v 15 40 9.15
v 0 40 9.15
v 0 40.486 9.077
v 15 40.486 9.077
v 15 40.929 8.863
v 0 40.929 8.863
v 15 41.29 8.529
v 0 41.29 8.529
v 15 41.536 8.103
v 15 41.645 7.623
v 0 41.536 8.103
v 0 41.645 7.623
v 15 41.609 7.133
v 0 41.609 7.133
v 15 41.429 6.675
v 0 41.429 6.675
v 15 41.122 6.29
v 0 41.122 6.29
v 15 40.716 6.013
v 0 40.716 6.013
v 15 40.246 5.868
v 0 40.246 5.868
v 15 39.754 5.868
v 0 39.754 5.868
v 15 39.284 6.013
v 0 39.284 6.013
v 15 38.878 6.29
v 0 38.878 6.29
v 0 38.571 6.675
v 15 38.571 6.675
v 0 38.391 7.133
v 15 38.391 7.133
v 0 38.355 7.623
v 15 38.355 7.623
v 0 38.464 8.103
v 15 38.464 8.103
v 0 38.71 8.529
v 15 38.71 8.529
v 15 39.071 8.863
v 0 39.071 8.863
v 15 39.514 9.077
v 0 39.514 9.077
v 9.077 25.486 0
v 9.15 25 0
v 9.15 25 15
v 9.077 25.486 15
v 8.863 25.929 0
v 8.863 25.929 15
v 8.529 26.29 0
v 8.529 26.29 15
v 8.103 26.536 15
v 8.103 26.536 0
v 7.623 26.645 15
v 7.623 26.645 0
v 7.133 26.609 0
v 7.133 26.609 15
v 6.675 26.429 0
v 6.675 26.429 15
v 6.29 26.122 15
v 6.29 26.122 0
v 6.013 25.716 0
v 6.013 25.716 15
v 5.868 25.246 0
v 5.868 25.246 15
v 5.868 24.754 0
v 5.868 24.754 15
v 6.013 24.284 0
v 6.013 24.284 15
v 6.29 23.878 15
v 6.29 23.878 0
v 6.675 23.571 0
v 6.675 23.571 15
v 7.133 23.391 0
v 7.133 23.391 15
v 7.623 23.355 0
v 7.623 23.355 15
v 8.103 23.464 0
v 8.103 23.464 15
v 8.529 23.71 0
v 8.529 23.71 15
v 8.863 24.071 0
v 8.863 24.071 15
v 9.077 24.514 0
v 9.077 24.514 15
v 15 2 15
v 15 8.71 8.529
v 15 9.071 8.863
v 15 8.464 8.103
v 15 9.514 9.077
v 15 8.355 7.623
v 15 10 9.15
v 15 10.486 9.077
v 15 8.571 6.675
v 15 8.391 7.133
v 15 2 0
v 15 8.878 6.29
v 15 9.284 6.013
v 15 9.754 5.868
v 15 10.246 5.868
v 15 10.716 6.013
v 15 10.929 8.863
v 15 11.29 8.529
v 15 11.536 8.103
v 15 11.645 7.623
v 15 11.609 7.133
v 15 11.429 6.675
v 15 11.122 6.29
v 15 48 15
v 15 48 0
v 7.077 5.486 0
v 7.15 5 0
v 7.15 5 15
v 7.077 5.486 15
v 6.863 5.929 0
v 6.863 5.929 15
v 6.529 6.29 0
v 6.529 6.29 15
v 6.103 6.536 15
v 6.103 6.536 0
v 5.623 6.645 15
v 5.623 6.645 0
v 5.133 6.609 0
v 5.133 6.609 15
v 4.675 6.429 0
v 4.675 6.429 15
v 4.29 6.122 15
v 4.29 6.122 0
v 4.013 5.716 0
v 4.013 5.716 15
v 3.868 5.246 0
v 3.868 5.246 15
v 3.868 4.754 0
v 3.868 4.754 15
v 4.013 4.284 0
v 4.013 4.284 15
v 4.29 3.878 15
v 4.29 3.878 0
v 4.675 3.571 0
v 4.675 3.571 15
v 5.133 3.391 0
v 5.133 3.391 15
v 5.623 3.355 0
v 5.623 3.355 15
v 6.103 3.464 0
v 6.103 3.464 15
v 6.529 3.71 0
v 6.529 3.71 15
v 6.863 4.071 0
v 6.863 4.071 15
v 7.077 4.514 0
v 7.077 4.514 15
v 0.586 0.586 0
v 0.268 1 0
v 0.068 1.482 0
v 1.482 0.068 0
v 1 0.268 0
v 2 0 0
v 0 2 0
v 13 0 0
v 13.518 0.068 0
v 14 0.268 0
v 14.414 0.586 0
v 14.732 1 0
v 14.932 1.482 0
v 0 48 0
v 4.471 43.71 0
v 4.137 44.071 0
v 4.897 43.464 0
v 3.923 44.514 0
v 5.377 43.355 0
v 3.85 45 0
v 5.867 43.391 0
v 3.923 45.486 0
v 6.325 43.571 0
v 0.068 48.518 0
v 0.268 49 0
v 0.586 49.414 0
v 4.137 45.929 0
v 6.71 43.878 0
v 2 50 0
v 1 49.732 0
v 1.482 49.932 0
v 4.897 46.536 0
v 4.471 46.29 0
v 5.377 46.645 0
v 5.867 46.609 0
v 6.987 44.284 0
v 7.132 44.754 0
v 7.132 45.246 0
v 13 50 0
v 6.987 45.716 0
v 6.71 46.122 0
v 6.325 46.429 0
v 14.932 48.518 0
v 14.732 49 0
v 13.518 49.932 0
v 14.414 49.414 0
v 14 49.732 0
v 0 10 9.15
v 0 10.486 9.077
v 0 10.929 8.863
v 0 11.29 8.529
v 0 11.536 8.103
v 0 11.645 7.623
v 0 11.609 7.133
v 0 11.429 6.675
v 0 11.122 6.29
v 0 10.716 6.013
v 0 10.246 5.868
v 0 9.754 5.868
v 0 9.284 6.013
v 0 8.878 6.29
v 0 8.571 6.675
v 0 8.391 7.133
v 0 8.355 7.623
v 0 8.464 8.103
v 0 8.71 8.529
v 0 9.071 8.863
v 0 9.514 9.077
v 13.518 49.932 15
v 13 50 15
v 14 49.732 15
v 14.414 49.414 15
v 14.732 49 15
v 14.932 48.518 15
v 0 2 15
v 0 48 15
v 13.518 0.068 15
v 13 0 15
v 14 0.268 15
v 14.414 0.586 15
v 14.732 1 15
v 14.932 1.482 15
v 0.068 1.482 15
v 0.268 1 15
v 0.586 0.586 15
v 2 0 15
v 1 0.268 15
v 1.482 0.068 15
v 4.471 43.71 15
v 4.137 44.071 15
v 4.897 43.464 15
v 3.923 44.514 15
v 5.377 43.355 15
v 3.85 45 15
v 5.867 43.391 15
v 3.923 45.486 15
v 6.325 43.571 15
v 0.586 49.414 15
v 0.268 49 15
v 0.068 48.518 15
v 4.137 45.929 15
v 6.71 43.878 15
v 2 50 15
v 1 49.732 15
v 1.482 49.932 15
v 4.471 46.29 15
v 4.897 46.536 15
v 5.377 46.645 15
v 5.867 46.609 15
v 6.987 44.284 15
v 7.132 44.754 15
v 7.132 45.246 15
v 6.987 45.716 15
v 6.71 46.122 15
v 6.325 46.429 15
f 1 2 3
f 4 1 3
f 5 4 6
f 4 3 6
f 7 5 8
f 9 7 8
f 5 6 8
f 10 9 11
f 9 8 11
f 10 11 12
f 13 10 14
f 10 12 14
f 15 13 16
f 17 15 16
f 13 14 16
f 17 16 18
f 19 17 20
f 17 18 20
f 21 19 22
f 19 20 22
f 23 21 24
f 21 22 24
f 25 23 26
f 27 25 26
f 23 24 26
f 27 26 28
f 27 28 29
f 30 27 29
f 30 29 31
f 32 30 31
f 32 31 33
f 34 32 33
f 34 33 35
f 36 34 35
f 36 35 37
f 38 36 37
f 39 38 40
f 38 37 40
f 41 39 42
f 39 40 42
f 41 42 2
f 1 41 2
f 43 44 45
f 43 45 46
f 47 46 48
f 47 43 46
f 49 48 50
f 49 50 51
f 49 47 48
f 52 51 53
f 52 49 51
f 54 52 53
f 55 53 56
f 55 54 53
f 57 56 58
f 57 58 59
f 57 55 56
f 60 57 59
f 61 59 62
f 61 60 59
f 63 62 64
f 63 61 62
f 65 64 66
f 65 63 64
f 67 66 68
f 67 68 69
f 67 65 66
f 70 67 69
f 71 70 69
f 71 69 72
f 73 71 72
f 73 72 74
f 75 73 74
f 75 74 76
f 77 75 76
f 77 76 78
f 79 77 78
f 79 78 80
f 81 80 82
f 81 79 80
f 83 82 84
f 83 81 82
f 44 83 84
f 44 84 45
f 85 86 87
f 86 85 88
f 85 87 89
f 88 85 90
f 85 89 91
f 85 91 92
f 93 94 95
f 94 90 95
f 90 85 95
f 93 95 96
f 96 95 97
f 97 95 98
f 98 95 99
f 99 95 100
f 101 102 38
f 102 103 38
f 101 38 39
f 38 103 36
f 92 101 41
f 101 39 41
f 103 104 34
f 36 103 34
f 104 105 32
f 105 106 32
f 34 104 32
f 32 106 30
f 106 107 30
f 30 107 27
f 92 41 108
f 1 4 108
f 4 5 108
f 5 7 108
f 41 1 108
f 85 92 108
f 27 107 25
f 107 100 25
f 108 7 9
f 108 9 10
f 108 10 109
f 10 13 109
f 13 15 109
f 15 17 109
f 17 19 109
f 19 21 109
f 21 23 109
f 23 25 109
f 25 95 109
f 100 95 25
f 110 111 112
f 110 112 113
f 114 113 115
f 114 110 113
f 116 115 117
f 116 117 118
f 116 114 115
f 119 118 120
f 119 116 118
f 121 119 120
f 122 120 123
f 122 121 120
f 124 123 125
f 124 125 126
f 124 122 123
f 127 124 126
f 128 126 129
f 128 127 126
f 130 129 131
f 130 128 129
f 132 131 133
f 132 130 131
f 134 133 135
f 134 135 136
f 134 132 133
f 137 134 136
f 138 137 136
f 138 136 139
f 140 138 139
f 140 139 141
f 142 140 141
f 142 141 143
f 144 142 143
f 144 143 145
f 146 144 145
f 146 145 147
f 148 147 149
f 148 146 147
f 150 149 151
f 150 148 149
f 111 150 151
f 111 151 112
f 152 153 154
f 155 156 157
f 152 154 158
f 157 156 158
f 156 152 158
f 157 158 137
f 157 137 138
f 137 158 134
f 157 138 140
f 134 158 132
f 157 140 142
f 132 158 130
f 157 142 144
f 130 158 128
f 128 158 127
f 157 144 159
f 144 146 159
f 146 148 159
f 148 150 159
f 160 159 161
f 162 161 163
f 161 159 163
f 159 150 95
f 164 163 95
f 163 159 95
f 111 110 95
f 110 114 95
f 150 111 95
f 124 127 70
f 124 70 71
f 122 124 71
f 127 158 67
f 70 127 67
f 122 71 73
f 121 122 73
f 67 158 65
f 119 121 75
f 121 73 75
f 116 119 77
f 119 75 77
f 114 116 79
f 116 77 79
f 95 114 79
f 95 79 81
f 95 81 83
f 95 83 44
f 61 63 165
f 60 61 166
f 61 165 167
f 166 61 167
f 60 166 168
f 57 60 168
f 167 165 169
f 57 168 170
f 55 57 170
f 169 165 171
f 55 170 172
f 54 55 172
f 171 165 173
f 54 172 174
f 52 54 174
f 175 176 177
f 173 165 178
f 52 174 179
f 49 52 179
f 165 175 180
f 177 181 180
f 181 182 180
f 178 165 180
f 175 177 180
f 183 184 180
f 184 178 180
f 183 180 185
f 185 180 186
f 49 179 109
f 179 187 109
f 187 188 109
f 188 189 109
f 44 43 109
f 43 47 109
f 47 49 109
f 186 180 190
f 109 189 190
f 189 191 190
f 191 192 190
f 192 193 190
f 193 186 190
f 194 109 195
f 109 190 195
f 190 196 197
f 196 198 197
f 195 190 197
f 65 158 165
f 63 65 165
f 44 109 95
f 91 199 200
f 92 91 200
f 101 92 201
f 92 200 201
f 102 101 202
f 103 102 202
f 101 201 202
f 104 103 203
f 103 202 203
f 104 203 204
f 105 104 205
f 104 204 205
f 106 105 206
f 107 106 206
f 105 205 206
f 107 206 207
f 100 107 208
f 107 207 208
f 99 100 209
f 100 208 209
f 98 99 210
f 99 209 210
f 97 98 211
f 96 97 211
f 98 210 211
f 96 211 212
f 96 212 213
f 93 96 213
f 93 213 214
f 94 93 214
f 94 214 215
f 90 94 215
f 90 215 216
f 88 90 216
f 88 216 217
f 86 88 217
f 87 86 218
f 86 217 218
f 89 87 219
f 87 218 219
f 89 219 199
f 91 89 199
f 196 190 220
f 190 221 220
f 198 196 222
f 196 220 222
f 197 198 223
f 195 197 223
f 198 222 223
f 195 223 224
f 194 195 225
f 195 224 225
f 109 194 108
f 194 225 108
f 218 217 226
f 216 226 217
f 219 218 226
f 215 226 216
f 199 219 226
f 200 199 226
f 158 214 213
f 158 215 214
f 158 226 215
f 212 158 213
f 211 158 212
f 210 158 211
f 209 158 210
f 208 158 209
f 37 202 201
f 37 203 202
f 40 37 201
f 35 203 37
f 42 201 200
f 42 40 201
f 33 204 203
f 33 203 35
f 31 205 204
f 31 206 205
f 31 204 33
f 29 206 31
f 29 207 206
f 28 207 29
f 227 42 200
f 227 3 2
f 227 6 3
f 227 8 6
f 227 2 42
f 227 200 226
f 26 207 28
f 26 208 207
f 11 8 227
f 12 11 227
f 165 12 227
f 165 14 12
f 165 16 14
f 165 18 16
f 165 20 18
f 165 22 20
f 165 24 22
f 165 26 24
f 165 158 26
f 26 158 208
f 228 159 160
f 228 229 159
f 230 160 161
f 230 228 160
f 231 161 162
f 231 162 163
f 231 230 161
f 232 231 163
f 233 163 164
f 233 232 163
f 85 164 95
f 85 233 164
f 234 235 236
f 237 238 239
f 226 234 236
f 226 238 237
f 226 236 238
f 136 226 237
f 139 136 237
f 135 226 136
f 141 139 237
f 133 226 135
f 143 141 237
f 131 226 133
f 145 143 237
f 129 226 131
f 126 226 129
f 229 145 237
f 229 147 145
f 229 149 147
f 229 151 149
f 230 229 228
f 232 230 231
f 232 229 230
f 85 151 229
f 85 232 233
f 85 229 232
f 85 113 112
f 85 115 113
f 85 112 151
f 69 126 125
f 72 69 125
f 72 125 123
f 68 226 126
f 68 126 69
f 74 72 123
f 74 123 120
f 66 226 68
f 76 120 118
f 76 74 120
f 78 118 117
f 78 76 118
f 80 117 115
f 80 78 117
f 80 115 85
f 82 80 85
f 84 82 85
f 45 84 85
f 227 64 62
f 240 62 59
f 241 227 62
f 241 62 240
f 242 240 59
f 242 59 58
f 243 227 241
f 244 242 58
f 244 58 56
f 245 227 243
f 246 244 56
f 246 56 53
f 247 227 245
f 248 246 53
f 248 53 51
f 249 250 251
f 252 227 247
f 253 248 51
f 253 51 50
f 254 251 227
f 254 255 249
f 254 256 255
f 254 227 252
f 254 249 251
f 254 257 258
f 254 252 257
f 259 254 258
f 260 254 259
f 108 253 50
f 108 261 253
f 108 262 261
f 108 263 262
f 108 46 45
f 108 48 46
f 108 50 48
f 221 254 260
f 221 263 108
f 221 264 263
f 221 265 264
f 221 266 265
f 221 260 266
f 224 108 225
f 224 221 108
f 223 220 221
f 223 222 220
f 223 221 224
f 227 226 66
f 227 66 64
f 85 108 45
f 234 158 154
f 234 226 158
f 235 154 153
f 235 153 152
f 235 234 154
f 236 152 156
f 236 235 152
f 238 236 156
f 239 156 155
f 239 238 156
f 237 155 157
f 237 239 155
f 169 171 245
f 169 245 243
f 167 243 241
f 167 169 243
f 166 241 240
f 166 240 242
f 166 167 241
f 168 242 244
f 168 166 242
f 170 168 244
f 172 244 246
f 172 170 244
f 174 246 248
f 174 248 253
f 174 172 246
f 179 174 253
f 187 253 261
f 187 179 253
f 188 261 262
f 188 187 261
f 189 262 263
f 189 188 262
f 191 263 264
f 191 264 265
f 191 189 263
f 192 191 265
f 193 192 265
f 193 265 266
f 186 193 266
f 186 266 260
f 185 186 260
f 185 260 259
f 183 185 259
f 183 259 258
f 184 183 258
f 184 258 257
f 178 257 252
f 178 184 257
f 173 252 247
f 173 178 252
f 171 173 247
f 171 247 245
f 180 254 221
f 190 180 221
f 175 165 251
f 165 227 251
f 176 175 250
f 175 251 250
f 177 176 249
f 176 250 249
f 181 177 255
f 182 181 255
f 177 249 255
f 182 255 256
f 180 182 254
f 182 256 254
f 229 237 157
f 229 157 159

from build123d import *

# Parameters (mm, degrees)
SKETCH_1_W          = 15
SKETCH_1_H          = 50
SKETCH_1_R          = 1.65
EXTRUDE_1_DEPTH     = 15
SKETCH_2_R          = 1.65
CUT_EXTRUDE_1_DEPTH = 15
FILLET_1_R          = 2


with BuildPart() as part:
    # ｽｹｯﾁ1 → ﾎﾞｽ - 押し出し1 (new body)
    with BuildSketch(Plane.XY):
        with Locations((7.5, 25)):
            Rectangle(SKETCH_1_W, SKETCH_1_H)
        with Locations((5.5, 5)):
            Circle(SKETCH_1_R, mode=Mode.SUBTRACT)
        with Locations(Location((5.5, 45, 0), (0, 0, 180))):
            Circle(SKETCH_1_R, mode=Mode.SUBTRACT)
        with Locations((7.5, 25)):
            Circle(SKETCH_1_R, mode=Mode.SUBTRACT)
    extrude(amount=EXTRUDE_1_DEPTH)

    # ｽｹｯﾁ2 → ｶｯﾄ - 押し出し1 (cut)
    with BuildSketch(Plane.ZY):
        with Locations((7.5, 40)):
            Circle(SKETCH_2_R)
        with Locations((7.5, 10)):
            Circle(SKETCH_2_R)
    extrude(amount=-CUT_EXTRUDE_1_DEPTH, mode=Mode.SUBTRACT)

    # ﾌｨﾚｯﾄ1
    fillet_1_edges = [part.edges().sort_by_distance(p)[0] for p in [
        (0, 50, 7.5),
        (15, 50, 7.5),
        (15, 0, 7.5),
        (0, 0, 7.5),
    ]]
    fillet(fillet_1_edges, radius=FILLET_1_R)


solid = part.part
